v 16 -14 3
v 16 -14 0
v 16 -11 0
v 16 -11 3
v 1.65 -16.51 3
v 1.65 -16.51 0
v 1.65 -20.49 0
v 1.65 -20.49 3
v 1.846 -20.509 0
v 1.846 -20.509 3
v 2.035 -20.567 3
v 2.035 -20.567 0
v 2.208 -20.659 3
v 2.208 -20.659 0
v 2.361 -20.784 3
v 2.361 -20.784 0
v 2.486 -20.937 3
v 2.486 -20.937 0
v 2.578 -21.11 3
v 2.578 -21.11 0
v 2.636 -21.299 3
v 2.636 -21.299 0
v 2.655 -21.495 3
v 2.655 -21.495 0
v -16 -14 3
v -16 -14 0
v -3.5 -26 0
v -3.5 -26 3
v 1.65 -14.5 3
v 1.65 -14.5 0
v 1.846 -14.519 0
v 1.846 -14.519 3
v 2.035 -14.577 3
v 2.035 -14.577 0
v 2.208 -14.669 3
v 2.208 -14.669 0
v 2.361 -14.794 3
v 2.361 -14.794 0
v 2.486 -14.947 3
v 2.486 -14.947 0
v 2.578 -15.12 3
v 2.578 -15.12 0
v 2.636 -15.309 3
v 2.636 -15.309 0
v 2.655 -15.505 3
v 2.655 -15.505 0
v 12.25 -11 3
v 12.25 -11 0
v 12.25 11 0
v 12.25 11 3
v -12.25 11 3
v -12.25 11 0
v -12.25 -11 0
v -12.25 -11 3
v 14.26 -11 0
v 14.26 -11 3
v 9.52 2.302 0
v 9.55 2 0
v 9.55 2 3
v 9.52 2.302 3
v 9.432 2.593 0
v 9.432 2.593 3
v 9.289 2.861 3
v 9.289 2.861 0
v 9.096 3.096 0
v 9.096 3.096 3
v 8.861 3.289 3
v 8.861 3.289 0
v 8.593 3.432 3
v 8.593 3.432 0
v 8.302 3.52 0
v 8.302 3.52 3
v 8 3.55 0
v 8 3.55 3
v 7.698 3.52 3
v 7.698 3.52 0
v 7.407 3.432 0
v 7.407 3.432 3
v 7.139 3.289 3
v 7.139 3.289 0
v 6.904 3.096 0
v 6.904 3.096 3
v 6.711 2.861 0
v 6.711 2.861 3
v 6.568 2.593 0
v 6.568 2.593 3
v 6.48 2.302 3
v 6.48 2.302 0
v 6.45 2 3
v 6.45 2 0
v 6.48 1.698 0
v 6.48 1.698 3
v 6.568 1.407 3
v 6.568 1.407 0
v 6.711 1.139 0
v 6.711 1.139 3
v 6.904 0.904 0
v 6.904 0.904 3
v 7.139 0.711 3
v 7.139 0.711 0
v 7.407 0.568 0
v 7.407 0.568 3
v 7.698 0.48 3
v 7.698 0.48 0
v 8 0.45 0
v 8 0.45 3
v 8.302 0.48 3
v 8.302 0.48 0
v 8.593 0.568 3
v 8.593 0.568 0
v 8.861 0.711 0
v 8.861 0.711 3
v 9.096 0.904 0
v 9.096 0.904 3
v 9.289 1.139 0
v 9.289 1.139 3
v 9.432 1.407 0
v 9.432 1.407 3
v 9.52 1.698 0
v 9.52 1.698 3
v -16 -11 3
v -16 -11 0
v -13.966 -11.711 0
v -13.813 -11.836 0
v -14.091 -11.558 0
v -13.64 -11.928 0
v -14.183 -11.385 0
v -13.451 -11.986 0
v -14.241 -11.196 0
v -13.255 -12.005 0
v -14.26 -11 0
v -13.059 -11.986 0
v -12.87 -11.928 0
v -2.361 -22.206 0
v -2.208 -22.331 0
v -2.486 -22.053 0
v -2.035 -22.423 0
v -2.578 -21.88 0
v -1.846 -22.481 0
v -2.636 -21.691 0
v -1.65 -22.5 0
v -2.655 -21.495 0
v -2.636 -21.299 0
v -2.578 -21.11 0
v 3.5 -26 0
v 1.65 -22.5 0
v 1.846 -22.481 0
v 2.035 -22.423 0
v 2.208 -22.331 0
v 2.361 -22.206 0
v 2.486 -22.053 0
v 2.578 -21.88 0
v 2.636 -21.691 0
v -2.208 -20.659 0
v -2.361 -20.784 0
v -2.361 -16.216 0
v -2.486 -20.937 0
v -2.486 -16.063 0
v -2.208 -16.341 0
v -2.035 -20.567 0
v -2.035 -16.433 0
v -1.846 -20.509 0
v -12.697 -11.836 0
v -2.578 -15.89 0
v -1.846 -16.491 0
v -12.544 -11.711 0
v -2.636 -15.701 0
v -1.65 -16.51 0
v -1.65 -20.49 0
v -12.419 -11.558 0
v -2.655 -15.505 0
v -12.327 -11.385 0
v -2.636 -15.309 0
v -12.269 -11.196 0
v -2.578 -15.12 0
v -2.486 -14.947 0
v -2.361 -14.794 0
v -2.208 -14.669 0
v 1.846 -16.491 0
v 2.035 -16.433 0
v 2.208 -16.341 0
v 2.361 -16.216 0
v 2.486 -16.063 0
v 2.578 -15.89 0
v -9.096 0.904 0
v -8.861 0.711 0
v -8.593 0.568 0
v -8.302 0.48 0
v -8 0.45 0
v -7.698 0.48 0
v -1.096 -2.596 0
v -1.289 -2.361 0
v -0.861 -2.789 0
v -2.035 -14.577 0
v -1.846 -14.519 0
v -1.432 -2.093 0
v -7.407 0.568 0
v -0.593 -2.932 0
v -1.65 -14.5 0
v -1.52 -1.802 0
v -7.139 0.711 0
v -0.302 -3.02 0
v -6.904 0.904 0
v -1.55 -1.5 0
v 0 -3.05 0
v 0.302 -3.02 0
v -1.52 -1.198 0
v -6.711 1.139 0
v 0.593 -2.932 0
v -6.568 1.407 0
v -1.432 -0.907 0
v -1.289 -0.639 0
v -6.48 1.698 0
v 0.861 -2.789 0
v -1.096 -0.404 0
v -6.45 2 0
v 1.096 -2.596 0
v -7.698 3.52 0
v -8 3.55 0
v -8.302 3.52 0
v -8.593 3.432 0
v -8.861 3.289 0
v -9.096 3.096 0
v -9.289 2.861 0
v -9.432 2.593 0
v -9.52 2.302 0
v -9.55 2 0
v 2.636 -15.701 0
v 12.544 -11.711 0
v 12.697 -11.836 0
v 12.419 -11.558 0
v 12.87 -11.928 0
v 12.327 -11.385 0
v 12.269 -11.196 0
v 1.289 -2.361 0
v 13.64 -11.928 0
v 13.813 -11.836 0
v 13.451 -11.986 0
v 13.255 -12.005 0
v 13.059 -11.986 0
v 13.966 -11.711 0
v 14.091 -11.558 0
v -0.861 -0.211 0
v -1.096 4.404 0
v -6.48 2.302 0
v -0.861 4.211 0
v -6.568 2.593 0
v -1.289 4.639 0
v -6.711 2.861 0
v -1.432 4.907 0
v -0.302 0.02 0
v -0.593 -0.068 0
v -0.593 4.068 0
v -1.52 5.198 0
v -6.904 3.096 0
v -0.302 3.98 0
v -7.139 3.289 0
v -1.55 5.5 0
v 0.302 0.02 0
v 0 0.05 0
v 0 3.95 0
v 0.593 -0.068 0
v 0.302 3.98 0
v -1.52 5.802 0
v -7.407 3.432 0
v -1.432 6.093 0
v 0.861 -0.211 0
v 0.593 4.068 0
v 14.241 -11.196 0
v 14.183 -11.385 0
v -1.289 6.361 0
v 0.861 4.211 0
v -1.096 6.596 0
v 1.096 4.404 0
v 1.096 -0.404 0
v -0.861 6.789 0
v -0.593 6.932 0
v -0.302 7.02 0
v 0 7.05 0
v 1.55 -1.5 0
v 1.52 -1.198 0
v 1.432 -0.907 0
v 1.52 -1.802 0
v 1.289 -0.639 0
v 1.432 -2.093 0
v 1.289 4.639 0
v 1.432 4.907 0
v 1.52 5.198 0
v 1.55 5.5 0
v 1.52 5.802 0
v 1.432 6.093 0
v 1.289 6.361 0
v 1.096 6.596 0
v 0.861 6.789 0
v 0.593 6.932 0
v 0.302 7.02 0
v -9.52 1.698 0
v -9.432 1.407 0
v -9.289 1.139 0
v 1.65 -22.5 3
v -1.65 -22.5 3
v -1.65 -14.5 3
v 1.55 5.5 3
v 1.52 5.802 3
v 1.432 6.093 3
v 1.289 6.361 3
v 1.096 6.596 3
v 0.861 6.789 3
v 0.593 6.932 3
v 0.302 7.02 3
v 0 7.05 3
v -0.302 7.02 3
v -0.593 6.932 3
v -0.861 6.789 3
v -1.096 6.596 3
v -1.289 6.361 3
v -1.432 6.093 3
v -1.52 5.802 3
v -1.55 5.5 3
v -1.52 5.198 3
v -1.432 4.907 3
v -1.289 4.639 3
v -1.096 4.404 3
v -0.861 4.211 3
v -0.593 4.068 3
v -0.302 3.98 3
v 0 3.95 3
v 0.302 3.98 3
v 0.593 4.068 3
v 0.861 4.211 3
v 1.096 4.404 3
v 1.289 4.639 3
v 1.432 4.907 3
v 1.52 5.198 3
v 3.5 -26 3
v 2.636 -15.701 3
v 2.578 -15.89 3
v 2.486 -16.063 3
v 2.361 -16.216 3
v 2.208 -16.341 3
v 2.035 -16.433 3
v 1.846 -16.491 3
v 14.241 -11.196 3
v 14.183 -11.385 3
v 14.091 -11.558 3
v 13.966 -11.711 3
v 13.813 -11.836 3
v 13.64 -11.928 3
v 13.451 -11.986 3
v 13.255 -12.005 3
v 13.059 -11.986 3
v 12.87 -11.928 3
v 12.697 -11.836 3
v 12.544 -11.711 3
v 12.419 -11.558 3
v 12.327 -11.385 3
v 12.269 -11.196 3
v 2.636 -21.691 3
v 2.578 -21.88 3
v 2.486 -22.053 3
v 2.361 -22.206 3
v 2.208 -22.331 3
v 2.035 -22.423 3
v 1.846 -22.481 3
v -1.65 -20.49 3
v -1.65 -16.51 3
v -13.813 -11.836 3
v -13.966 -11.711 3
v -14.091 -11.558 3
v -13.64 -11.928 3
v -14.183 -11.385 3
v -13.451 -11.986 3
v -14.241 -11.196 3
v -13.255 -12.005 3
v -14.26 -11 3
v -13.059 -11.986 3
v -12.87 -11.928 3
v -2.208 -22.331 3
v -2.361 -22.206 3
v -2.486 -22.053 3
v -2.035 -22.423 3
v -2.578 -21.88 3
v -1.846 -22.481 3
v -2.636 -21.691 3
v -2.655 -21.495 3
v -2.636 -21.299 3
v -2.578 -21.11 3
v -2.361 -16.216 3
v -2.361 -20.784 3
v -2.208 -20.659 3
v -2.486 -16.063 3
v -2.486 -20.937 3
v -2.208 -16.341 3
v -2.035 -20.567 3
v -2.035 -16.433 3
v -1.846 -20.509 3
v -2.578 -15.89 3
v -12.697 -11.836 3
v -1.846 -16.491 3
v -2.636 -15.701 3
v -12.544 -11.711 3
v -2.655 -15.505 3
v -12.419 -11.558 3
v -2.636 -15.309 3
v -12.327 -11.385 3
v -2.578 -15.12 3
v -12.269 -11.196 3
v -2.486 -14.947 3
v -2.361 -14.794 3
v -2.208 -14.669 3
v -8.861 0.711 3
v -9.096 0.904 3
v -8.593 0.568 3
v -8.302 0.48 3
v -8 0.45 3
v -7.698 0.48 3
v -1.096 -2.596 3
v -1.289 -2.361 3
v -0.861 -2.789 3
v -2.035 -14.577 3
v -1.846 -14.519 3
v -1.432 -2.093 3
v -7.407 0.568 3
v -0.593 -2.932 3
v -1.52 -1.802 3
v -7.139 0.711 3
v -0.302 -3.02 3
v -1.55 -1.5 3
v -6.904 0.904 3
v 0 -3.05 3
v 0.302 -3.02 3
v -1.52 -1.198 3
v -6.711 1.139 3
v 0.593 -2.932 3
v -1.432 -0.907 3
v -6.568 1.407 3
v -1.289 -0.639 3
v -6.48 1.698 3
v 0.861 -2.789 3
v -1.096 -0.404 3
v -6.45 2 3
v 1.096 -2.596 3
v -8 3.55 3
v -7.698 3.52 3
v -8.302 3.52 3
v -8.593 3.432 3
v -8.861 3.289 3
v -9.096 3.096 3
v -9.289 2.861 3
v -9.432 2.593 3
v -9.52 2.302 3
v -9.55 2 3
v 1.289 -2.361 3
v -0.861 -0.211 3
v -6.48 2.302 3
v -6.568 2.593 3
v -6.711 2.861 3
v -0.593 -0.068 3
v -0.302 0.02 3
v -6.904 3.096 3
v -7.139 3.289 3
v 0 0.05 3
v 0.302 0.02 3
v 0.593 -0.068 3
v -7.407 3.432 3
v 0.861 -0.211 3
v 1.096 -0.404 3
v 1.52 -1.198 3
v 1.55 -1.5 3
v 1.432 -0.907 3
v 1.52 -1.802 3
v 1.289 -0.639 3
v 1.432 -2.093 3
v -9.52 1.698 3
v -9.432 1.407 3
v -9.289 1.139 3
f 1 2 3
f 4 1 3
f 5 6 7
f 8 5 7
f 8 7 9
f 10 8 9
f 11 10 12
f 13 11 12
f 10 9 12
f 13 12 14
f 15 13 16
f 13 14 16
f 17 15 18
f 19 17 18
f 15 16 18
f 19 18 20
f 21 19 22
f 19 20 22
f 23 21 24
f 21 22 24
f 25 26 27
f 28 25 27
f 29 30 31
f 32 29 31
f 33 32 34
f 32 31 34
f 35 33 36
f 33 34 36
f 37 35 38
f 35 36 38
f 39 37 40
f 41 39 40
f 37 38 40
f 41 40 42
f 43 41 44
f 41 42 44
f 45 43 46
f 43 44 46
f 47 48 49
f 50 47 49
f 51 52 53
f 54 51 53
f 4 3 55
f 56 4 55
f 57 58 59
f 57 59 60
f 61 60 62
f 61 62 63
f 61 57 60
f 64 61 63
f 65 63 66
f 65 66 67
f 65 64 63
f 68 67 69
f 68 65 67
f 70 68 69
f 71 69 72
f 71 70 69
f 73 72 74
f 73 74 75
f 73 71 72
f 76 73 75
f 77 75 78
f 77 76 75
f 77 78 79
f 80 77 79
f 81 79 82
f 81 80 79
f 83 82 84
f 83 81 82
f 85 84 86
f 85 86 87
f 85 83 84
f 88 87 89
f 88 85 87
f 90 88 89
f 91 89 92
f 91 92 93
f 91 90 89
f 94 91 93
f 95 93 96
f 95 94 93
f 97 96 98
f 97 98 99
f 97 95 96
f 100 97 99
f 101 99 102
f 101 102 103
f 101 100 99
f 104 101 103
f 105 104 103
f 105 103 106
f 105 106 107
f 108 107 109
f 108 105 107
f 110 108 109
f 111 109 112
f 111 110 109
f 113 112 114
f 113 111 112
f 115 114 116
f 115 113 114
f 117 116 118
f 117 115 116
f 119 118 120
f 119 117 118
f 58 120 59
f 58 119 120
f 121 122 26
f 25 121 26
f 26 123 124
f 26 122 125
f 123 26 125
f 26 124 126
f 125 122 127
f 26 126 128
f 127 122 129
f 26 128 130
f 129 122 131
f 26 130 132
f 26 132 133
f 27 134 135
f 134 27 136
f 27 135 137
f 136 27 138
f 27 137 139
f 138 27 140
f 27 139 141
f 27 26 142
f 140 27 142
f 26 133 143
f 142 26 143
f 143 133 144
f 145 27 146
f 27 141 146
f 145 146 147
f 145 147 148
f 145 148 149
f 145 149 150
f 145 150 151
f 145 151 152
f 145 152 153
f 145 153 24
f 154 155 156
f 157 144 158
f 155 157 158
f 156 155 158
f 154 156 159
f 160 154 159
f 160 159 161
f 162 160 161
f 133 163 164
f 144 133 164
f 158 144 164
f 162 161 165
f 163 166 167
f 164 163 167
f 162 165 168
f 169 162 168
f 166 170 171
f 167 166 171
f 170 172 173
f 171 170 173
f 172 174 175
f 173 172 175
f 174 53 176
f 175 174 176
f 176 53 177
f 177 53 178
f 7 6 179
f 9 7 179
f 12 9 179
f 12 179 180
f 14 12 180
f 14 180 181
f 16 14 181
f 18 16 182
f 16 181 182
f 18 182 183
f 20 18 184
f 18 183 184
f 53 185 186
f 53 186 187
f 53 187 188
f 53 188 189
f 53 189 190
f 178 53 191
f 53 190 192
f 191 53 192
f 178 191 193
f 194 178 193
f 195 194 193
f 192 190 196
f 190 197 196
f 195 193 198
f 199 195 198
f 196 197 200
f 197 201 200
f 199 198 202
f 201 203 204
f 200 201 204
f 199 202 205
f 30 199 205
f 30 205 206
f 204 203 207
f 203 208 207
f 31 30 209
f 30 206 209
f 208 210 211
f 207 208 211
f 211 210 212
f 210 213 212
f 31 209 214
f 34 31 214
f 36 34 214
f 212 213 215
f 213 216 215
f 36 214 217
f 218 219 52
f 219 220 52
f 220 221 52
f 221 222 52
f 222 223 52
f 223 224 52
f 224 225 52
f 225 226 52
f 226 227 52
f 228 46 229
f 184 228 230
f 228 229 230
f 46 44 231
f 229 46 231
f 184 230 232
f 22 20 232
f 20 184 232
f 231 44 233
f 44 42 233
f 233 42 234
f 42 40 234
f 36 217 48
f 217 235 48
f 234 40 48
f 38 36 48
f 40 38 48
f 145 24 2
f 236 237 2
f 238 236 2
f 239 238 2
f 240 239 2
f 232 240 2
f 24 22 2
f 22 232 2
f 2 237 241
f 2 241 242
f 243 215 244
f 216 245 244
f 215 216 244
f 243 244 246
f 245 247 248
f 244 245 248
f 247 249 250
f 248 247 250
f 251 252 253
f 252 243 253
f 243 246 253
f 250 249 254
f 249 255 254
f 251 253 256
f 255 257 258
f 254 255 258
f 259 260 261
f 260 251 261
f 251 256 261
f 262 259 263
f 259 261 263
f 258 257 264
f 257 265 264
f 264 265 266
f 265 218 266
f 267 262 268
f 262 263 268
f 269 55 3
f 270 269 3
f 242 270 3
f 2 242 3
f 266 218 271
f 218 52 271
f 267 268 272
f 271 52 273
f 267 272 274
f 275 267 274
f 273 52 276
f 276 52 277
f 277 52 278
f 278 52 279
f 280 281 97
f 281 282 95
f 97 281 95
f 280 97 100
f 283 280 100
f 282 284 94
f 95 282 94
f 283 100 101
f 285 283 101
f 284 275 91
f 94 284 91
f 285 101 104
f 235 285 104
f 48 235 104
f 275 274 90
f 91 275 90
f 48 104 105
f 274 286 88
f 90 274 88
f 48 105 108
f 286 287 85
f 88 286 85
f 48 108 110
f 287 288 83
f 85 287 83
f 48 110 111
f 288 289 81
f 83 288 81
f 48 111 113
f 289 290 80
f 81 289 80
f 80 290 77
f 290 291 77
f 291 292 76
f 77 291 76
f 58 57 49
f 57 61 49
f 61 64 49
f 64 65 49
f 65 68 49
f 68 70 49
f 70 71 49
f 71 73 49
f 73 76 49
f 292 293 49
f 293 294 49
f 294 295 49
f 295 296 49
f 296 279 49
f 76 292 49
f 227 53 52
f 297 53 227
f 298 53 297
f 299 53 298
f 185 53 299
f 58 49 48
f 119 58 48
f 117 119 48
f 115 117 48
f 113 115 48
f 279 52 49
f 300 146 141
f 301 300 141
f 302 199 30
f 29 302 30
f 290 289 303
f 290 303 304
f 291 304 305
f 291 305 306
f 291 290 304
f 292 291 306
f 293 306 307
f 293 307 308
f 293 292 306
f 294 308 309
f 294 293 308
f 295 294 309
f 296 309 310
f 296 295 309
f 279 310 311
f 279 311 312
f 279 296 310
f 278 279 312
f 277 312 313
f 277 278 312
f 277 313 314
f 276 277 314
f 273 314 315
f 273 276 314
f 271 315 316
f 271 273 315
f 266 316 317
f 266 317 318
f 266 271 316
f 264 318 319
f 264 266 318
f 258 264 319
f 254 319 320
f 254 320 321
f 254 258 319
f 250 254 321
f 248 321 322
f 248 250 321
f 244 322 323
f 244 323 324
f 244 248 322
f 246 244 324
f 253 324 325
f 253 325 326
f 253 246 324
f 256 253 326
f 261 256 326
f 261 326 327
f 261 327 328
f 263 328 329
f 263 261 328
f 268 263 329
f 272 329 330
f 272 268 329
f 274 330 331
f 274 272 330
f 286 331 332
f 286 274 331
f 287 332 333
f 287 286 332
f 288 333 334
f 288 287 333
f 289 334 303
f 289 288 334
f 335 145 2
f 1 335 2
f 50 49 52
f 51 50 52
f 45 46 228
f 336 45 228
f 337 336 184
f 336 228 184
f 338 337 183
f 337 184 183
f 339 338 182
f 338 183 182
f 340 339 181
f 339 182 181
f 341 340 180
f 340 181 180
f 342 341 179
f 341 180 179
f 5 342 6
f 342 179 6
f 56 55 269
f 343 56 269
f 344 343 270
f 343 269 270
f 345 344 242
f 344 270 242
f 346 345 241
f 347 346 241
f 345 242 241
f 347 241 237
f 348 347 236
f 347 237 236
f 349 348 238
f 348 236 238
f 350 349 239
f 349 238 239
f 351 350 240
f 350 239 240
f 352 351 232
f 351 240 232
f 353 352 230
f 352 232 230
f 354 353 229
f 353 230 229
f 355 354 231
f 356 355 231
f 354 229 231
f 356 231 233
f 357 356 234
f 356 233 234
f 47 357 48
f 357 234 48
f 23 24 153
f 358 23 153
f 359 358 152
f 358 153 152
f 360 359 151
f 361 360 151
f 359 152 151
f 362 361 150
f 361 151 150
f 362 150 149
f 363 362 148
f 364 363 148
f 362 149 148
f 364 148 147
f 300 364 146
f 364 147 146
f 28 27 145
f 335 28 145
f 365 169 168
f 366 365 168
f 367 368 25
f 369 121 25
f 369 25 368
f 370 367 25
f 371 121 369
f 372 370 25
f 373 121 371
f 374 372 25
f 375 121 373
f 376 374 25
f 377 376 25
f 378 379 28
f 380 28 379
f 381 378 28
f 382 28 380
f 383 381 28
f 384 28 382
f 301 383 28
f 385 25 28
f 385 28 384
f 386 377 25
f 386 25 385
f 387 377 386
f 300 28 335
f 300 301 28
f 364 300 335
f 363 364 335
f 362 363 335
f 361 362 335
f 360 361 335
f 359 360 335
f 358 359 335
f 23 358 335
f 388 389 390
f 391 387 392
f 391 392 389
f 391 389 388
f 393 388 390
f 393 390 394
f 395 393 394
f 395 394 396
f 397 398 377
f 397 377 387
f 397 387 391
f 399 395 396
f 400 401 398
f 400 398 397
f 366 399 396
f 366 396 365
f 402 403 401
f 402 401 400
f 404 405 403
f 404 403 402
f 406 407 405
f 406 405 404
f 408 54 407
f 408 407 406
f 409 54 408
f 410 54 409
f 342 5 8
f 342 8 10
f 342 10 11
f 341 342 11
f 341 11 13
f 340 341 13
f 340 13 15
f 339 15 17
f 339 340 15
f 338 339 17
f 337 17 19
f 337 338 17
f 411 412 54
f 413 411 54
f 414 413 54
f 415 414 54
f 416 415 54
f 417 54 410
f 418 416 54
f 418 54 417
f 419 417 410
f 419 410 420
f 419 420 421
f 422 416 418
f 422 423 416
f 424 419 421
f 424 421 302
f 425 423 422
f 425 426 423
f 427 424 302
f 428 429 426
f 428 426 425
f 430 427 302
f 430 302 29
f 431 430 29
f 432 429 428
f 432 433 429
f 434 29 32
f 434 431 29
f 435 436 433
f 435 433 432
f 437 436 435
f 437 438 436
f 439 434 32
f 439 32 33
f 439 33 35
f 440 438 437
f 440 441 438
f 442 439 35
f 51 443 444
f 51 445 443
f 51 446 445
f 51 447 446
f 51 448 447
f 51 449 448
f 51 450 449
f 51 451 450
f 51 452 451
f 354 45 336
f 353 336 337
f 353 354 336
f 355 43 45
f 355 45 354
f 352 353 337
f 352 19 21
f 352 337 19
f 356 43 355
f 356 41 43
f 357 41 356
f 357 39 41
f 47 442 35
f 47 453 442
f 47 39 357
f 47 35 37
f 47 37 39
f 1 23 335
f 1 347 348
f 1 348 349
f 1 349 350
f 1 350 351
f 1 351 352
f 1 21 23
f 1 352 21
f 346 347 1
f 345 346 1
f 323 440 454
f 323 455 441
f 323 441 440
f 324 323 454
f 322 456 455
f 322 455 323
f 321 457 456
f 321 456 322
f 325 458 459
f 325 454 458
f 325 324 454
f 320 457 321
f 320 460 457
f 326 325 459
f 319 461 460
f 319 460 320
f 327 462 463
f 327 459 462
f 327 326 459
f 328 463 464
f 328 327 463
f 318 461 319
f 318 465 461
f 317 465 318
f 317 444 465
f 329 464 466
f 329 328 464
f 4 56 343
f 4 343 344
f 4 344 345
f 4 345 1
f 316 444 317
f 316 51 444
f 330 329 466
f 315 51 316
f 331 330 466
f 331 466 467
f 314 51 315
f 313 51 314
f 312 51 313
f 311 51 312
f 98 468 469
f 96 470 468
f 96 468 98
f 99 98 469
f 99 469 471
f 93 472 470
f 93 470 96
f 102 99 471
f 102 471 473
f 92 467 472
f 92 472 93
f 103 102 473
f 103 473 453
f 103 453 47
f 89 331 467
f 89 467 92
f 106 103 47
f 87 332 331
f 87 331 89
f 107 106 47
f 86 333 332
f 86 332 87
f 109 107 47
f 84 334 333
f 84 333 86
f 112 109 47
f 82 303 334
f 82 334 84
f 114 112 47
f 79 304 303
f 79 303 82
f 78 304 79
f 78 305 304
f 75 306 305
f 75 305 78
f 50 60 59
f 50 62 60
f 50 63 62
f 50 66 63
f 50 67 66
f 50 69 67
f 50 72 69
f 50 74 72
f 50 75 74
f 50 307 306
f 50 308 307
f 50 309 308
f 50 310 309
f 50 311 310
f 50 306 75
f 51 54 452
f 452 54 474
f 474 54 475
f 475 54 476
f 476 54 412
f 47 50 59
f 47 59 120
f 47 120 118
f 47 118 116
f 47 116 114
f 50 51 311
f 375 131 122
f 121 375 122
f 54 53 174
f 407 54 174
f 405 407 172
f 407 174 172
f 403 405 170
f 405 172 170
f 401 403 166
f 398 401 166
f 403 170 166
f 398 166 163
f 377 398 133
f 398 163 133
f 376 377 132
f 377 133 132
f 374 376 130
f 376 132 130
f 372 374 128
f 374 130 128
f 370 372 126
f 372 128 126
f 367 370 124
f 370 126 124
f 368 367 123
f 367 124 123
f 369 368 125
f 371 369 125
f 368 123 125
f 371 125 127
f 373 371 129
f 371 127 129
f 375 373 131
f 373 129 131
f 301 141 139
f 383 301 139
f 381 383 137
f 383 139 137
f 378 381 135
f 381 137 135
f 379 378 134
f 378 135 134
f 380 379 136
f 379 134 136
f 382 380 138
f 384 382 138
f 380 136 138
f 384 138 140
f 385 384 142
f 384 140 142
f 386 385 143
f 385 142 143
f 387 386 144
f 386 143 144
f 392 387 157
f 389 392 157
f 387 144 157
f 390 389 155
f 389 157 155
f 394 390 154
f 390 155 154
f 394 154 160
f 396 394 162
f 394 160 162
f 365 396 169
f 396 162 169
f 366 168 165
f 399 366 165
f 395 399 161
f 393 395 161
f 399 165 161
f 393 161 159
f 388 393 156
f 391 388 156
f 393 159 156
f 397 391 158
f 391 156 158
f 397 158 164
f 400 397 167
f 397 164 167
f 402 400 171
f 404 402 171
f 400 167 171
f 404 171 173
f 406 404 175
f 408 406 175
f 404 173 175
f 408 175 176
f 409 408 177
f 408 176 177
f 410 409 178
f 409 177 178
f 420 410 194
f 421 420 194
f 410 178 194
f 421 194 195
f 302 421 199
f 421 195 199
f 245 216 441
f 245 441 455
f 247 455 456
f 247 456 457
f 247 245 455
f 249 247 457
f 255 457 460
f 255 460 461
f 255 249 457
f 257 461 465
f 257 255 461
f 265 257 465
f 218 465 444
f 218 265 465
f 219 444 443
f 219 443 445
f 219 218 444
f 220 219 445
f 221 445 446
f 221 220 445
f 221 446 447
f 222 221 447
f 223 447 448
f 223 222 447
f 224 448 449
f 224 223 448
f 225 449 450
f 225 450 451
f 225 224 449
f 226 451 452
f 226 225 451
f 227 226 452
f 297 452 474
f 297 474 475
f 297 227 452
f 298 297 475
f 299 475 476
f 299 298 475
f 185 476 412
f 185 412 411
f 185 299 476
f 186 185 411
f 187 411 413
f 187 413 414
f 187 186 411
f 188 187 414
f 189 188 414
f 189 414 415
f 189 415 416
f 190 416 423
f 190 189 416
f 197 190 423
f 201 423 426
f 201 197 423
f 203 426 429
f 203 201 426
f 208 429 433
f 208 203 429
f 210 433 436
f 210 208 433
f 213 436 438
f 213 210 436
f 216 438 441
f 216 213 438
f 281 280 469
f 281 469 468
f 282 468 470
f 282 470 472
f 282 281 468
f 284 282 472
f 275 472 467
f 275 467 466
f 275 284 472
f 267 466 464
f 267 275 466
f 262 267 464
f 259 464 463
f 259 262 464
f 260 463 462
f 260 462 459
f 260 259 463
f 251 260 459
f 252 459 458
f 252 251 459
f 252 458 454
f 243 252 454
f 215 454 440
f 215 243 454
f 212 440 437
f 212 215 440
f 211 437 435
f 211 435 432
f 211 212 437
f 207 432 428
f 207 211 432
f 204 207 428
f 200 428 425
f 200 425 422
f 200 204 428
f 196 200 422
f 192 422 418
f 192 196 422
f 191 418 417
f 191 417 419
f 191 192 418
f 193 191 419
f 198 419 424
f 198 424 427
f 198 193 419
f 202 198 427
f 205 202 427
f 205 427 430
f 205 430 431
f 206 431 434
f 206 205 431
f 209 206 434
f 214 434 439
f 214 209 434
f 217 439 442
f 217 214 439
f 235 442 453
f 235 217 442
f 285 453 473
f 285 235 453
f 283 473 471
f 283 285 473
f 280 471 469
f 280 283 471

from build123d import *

# Parameters (mm, degrees)
SKETCH_1_R      = 1.55
EXTRUDE_1_DEPTH = 3


with BuildPart() as part:
    # 草图1 → 凸台-拉伸1 (new body)
    with BuildSketch(Plane.XY):
        with BuildLine():
            Line((-12.25, 11), (-12.25, -11))
            ThreePointArc((-12.25, -11), (-13.255, -12.005), (-14.26, -11))
            Line((-14.26, -11), (-16, -11))
            Line((-16, -11), (-16, -14))
            Line((-16, -14), (-3.5, -26))
            Line((-3.5, -26), (3.5, -26))
            Line((3.5, -26), (16, -14))
            Line((16, -14), (16, -11))
            Line((16, -11), (14.26, -11))
            ThreePointArc((14.26, -11), (13.255, -12.005), (12.25, -11))
            Line((12.25, -11), (12.25, 11))
            Line((12.25, 11), (-12.25, 11))
        make_face()
        with BuildLine():
            ThreePointArc((2.655, -21.495), (2.360642315, -22.205642315), (1.65, -22.5))
            Line((1.65, -22.5), (-1.65, -22.5))
            ThreePointArc((-1.65, -22.5), (-2.655, -21.495), (-1.65, -20.49))
            Line((-1.65, -20.49), (-1.65, -16.51))
            ThreePointArc((-1.65, -16.51), (-2.655, -15.505), (-1.65, -14.5))
            Line((-1.65, -14.5), (1.65, -14.5))
            ThreePointArc((1.65, -14.5), (2.360642315, -14.794357685), (2.655, -15.505))
            ThreePointArc((2.655, -15.505), (2.360642315, -16.215642315), (1.65, -16.51))
            Line((1.65, -16.51), (1.65, -20.49))
            ThreePointArc((1.65, -20.49), (2.360642315, -20.784357685), (2.655, -21.495))
        make_face(mode=Mode.SUBTRACT)
        with Locations((-8, 2)):
            Circle(SKETCH_1_R, mode=Mode.SUBTRACT)
        with Locations((0, -1.5)):
            Circle(SKETCH_1_R, mode=Mode.SUBTRACT)
        with Locations((0, 5.5)):
            Circle(SKETCH_1_R, mode=Mode.SUBTRACT)
        with Locations((8, 2)):
            Circle(SKETCH_1_R, mode=Mode.SUBTRACT)
    extrude(amount=EXTRUDE_1_DEPTH)


solid = part.part
